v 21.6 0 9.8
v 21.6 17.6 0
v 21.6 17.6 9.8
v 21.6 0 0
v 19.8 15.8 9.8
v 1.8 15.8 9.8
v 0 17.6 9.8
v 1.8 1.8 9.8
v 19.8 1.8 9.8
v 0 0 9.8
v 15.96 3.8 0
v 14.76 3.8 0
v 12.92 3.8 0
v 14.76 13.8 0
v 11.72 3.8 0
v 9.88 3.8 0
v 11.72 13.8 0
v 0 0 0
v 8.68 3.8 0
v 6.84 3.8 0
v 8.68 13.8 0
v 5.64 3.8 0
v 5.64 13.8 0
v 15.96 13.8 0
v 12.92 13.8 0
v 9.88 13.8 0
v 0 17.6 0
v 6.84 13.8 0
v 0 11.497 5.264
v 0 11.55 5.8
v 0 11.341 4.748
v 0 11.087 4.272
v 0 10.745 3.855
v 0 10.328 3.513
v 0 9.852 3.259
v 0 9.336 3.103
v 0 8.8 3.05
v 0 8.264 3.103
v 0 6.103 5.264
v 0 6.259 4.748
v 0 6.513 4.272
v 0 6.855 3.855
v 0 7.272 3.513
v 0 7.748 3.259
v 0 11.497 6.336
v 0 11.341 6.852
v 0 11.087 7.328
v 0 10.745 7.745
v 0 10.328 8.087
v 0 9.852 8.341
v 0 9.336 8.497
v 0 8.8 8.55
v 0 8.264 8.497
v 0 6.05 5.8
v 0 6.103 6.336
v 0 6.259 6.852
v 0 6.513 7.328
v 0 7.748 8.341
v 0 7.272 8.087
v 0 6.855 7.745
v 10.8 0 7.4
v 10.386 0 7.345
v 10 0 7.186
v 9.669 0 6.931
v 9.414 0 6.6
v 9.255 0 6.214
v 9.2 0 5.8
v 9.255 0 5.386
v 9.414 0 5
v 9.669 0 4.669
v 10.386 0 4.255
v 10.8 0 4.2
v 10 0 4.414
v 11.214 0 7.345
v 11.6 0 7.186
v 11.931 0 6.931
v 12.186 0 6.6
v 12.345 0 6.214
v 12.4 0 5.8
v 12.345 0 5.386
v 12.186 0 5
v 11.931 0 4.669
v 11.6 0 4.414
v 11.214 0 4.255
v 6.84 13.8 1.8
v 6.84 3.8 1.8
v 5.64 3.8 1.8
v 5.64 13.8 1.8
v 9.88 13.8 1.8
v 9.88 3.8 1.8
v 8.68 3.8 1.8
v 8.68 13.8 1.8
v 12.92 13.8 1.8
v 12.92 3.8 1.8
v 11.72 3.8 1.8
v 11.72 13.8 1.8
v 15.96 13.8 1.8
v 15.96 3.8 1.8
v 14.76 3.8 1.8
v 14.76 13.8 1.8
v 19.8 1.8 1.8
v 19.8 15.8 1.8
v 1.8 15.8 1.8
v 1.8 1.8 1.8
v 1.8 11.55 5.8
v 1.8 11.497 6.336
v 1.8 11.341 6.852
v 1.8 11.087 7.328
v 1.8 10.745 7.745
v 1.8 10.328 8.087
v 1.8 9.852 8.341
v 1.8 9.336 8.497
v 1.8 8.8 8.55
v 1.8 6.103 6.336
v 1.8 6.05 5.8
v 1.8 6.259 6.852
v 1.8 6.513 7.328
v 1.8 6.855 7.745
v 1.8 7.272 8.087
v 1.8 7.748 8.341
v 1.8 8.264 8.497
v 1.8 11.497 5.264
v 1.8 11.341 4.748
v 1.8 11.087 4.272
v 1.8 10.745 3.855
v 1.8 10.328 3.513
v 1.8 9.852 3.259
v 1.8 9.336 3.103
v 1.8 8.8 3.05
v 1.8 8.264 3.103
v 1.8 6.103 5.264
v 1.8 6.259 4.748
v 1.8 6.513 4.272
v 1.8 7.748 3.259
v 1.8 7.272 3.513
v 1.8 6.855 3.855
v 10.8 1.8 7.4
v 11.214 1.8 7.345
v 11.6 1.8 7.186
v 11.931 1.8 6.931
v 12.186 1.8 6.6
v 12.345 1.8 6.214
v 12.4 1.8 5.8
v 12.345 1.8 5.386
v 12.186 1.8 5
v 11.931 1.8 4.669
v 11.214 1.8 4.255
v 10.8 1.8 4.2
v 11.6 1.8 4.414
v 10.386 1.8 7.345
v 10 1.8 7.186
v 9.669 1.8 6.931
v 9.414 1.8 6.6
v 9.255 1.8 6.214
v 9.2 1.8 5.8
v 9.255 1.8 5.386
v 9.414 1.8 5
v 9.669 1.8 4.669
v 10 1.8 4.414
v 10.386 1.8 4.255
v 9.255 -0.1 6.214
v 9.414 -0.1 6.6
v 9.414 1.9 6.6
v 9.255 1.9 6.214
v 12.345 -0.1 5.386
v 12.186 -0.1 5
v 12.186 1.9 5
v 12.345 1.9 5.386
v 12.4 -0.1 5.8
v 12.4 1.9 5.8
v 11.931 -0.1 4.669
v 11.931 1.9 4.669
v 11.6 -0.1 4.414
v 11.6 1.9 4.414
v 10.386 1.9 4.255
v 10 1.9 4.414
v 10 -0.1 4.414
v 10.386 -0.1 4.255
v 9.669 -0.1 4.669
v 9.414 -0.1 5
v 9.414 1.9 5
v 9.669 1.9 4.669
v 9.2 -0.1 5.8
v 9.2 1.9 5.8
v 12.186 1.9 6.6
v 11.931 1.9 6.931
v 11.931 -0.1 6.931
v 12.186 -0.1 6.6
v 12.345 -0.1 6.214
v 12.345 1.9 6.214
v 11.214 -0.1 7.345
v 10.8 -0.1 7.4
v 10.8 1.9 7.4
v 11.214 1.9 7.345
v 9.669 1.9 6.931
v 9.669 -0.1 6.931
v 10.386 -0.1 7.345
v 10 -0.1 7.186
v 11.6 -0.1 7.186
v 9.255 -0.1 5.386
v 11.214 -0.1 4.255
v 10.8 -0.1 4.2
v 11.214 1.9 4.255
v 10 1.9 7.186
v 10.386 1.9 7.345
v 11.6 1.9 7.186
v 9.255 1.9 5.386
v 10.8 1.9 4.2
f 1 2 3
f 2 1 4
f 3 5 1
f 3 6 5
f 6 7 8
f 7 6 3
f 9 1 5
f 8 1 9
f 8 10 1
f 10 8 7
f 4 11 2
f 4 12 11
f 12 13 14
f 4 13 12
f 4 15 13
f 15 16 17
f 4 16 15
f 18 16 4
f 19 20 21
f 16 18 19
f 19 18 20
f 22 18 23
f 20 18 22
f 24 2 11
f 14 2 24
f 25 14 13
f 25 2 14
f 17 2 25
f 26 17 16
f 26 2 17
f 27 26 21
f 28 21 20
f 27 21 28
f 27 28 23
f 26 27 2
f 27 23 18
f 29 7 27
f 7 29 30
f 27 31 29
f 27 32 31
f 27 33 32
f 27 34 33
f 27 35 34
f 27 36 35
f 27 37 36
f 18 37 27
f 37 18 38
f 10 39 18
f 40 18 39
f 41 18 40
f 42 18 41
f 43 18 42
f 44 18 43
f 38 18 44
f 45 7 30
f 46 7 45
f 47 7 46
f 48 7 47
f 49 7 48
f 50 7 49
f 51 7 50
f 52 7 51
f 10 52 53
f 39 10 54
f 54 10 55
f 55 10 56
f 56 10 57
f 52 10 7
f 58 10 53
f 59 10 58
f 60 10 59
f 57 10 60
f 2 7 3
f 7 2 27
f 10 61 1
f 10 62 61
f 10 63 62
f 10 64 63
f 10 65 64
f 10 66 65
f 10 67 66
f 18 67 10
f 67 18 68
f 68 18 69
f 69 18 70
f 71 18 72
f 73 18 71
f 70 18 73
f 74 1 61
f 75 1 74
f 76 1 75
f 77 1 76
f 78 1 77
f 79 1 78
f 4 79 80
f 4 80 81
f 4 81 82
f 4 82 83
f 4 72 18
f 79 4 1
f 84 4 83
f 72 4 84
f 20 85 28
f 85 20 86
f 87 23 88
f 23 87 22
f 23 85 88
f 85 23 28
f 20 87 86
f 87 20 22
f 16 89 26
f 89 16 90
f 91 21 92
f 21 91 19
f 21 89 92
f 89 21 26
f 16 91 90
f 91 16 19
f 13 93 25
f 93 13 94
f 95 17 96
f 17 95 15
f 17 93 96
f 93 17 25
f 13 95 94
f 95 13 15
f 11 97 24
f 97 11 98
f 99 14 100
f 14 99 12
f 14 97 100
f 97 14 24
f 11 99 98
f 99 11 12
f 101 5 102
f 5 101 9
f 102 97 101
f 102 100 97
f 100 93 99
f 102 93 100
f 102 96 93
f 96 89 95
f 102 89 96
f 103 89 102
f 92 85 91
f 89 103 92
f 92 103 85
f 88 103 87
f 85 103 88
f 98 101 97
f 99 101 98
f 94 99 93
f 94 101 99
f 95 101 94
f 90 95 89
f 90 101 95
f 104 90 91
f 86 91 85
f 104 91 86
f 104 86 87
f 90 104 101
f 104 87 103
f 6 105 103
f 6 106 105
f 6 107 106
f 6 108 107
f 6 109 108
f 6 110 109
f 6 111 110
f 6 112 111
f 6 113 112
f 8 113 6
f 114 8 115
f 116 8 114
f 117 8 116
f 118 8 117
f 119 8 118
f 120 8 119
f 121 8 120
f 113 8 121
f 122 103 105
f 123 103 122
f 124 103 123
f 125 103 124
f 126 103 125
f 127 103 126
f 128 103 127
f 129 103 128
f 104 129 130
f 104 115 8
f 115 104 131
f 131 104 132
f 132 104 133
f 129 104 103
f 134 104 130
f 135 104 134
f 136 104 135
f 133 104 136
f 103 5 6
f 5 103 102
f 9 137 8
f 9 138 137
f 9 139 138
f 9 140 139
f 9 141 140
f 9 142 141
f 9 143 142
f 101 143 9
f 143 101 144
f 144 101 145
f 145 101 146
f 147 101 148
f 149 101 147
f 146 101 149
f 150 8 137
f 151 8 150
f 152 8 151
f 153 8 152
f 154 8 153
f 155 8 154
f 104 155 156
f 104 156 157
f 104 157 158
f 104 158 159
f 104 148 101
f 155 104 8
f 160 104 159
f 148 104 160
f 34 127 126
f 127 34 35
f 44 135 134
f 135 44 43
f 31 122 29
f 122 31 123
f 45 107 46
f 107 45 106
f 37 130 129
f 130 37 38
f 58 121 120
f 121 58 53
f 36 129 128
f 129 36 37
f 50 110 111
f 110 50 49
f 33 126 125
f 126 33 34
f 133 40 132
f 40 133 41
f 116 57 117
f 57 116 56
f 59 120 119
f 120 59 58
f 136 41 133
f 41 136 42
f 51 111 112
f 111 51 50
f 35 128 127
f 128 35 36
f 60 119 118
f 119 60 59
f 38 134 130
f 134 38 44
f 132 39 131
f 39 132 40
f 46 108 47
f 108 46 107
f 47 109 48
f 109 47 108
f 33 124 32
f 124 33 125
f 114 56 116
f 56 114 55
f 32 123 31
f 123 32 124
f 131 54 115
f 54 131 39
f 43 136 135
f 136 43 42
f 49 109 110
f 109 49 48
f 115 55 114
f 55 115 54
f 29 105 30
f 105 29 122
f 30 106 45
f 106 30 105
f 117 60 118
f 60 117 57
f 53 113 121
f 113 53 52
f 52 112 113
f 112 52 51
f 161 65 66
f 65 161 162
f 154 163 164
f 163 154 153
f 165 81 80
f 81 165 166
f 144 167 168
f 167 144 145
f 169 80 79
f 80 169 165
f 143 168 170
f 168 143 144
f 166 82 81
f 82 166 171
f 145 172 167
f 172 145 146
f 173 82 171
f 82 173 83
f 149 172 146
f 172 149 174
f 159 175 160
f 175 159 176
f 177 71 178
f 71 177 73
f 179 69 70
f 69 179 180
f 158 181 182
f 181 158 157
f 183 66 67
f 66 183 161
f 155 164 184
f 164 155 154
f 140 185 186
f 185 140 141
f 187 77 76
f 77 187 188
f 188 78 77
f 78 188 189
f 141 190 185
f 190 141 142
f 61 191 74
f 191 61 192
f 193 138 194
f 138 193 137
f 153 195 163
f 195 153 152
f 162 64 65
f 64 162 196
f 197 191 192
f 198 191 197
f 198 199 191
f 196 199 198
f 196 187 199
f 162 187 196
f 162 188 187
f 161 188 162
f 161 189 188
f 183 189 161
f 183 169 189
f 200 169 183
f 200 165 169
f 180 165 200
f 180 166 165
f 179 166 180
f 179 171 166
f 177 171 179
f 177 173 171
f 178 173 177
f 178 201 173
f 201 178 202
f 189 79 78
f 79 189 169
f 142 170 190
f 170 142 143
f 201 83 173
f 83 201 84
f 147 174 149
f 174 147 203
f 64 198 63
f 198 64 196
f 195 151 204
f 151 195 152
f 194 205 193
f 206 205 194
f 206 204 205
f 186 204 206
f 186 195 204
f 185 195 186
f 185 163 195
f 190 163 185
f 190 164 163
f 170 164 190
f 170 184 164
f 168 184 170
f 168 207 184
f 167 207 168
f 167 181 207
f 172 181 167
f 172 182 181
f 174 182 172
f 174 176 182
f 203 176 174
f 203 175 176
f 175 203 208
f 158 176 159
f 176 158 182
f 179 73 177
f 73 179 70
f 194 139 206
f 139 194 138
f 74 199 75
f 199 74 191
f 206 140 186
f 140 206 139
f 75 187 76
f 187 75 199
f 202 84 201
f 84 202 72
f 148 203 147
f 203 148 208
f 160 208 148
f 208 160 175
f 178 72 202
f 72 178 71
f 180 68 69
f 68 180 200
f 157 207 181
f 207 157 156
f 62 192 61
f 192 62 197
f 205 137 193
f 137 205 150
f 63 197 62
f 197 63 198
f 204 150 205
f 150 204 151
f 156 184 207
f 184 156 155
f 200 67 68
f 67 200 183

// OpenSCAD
// Externes Sensorköpfchen für BME280 (Pimoroni/Adafruit-Breakout)
// Der D1 Mini Pro sitzt im fertigen DIN-Halter:
// https://www.printables.com/model/1530436-d1mini-din-rail-mount
//
// STL: openscad -o bme_sensor_pod.stl bme_sensor_pod.scad

bme_l = 18.0;
bme_w = 14.0;
bme_h = 8.0;
bme_cable_d = 5.5;
pod_wall = 1.8;

$fn = 32;

module ventilation_slots(x, y, w, l, count = 5) {
  slot_w = 1.2;
  gap = (l - count * slot_w) / (count + 1);
  for (i = [0 : count - 1]) {
    translate([x + gap + i * (slot_w + gap), y, -0.1])
      cube([slot_w, w, pod_wall + 0.4]);
  }
}

difference() {
  union() {
    cube([bme_l + 2 * pod_wall, bme_w + 2 * pod_wall, bme_h + pod_wall]);
    translate([pod_wall + 3, bme_w / 2 + pod_wall, bme_h / 2 + pod_wall])
      rotate([0, 90, 0])
        cylinder(h = 8, d = bme_cable_d + 1.5, center = true, $fn = 32);
  }
  translate([pod_wall, pod_wall, pod_wall])
    cube([bme_l, bme_w, bme_h + 0.2]);
  ventilation_slots(pod_wall + 2, pod_wall + 2, bme_w - 4, bme_l - 4, 4);
  translate([-0.1, bme_w / 2 + pod_wall, bme_h / 2 + pod_wall])
    rotate([0, 90, 0])
      cylinder(h = pod_wall + 0.2, d = bme_cable_d, $fn = 32);
}

translate([bme_l / 2 + pod_wall, -0.1, bme_h / 2 + pod_wall])
  rotate([-90, 0, 0])
    cylinder(h = pod_wall + 0.2, d = 3.2, $fn = 24);
